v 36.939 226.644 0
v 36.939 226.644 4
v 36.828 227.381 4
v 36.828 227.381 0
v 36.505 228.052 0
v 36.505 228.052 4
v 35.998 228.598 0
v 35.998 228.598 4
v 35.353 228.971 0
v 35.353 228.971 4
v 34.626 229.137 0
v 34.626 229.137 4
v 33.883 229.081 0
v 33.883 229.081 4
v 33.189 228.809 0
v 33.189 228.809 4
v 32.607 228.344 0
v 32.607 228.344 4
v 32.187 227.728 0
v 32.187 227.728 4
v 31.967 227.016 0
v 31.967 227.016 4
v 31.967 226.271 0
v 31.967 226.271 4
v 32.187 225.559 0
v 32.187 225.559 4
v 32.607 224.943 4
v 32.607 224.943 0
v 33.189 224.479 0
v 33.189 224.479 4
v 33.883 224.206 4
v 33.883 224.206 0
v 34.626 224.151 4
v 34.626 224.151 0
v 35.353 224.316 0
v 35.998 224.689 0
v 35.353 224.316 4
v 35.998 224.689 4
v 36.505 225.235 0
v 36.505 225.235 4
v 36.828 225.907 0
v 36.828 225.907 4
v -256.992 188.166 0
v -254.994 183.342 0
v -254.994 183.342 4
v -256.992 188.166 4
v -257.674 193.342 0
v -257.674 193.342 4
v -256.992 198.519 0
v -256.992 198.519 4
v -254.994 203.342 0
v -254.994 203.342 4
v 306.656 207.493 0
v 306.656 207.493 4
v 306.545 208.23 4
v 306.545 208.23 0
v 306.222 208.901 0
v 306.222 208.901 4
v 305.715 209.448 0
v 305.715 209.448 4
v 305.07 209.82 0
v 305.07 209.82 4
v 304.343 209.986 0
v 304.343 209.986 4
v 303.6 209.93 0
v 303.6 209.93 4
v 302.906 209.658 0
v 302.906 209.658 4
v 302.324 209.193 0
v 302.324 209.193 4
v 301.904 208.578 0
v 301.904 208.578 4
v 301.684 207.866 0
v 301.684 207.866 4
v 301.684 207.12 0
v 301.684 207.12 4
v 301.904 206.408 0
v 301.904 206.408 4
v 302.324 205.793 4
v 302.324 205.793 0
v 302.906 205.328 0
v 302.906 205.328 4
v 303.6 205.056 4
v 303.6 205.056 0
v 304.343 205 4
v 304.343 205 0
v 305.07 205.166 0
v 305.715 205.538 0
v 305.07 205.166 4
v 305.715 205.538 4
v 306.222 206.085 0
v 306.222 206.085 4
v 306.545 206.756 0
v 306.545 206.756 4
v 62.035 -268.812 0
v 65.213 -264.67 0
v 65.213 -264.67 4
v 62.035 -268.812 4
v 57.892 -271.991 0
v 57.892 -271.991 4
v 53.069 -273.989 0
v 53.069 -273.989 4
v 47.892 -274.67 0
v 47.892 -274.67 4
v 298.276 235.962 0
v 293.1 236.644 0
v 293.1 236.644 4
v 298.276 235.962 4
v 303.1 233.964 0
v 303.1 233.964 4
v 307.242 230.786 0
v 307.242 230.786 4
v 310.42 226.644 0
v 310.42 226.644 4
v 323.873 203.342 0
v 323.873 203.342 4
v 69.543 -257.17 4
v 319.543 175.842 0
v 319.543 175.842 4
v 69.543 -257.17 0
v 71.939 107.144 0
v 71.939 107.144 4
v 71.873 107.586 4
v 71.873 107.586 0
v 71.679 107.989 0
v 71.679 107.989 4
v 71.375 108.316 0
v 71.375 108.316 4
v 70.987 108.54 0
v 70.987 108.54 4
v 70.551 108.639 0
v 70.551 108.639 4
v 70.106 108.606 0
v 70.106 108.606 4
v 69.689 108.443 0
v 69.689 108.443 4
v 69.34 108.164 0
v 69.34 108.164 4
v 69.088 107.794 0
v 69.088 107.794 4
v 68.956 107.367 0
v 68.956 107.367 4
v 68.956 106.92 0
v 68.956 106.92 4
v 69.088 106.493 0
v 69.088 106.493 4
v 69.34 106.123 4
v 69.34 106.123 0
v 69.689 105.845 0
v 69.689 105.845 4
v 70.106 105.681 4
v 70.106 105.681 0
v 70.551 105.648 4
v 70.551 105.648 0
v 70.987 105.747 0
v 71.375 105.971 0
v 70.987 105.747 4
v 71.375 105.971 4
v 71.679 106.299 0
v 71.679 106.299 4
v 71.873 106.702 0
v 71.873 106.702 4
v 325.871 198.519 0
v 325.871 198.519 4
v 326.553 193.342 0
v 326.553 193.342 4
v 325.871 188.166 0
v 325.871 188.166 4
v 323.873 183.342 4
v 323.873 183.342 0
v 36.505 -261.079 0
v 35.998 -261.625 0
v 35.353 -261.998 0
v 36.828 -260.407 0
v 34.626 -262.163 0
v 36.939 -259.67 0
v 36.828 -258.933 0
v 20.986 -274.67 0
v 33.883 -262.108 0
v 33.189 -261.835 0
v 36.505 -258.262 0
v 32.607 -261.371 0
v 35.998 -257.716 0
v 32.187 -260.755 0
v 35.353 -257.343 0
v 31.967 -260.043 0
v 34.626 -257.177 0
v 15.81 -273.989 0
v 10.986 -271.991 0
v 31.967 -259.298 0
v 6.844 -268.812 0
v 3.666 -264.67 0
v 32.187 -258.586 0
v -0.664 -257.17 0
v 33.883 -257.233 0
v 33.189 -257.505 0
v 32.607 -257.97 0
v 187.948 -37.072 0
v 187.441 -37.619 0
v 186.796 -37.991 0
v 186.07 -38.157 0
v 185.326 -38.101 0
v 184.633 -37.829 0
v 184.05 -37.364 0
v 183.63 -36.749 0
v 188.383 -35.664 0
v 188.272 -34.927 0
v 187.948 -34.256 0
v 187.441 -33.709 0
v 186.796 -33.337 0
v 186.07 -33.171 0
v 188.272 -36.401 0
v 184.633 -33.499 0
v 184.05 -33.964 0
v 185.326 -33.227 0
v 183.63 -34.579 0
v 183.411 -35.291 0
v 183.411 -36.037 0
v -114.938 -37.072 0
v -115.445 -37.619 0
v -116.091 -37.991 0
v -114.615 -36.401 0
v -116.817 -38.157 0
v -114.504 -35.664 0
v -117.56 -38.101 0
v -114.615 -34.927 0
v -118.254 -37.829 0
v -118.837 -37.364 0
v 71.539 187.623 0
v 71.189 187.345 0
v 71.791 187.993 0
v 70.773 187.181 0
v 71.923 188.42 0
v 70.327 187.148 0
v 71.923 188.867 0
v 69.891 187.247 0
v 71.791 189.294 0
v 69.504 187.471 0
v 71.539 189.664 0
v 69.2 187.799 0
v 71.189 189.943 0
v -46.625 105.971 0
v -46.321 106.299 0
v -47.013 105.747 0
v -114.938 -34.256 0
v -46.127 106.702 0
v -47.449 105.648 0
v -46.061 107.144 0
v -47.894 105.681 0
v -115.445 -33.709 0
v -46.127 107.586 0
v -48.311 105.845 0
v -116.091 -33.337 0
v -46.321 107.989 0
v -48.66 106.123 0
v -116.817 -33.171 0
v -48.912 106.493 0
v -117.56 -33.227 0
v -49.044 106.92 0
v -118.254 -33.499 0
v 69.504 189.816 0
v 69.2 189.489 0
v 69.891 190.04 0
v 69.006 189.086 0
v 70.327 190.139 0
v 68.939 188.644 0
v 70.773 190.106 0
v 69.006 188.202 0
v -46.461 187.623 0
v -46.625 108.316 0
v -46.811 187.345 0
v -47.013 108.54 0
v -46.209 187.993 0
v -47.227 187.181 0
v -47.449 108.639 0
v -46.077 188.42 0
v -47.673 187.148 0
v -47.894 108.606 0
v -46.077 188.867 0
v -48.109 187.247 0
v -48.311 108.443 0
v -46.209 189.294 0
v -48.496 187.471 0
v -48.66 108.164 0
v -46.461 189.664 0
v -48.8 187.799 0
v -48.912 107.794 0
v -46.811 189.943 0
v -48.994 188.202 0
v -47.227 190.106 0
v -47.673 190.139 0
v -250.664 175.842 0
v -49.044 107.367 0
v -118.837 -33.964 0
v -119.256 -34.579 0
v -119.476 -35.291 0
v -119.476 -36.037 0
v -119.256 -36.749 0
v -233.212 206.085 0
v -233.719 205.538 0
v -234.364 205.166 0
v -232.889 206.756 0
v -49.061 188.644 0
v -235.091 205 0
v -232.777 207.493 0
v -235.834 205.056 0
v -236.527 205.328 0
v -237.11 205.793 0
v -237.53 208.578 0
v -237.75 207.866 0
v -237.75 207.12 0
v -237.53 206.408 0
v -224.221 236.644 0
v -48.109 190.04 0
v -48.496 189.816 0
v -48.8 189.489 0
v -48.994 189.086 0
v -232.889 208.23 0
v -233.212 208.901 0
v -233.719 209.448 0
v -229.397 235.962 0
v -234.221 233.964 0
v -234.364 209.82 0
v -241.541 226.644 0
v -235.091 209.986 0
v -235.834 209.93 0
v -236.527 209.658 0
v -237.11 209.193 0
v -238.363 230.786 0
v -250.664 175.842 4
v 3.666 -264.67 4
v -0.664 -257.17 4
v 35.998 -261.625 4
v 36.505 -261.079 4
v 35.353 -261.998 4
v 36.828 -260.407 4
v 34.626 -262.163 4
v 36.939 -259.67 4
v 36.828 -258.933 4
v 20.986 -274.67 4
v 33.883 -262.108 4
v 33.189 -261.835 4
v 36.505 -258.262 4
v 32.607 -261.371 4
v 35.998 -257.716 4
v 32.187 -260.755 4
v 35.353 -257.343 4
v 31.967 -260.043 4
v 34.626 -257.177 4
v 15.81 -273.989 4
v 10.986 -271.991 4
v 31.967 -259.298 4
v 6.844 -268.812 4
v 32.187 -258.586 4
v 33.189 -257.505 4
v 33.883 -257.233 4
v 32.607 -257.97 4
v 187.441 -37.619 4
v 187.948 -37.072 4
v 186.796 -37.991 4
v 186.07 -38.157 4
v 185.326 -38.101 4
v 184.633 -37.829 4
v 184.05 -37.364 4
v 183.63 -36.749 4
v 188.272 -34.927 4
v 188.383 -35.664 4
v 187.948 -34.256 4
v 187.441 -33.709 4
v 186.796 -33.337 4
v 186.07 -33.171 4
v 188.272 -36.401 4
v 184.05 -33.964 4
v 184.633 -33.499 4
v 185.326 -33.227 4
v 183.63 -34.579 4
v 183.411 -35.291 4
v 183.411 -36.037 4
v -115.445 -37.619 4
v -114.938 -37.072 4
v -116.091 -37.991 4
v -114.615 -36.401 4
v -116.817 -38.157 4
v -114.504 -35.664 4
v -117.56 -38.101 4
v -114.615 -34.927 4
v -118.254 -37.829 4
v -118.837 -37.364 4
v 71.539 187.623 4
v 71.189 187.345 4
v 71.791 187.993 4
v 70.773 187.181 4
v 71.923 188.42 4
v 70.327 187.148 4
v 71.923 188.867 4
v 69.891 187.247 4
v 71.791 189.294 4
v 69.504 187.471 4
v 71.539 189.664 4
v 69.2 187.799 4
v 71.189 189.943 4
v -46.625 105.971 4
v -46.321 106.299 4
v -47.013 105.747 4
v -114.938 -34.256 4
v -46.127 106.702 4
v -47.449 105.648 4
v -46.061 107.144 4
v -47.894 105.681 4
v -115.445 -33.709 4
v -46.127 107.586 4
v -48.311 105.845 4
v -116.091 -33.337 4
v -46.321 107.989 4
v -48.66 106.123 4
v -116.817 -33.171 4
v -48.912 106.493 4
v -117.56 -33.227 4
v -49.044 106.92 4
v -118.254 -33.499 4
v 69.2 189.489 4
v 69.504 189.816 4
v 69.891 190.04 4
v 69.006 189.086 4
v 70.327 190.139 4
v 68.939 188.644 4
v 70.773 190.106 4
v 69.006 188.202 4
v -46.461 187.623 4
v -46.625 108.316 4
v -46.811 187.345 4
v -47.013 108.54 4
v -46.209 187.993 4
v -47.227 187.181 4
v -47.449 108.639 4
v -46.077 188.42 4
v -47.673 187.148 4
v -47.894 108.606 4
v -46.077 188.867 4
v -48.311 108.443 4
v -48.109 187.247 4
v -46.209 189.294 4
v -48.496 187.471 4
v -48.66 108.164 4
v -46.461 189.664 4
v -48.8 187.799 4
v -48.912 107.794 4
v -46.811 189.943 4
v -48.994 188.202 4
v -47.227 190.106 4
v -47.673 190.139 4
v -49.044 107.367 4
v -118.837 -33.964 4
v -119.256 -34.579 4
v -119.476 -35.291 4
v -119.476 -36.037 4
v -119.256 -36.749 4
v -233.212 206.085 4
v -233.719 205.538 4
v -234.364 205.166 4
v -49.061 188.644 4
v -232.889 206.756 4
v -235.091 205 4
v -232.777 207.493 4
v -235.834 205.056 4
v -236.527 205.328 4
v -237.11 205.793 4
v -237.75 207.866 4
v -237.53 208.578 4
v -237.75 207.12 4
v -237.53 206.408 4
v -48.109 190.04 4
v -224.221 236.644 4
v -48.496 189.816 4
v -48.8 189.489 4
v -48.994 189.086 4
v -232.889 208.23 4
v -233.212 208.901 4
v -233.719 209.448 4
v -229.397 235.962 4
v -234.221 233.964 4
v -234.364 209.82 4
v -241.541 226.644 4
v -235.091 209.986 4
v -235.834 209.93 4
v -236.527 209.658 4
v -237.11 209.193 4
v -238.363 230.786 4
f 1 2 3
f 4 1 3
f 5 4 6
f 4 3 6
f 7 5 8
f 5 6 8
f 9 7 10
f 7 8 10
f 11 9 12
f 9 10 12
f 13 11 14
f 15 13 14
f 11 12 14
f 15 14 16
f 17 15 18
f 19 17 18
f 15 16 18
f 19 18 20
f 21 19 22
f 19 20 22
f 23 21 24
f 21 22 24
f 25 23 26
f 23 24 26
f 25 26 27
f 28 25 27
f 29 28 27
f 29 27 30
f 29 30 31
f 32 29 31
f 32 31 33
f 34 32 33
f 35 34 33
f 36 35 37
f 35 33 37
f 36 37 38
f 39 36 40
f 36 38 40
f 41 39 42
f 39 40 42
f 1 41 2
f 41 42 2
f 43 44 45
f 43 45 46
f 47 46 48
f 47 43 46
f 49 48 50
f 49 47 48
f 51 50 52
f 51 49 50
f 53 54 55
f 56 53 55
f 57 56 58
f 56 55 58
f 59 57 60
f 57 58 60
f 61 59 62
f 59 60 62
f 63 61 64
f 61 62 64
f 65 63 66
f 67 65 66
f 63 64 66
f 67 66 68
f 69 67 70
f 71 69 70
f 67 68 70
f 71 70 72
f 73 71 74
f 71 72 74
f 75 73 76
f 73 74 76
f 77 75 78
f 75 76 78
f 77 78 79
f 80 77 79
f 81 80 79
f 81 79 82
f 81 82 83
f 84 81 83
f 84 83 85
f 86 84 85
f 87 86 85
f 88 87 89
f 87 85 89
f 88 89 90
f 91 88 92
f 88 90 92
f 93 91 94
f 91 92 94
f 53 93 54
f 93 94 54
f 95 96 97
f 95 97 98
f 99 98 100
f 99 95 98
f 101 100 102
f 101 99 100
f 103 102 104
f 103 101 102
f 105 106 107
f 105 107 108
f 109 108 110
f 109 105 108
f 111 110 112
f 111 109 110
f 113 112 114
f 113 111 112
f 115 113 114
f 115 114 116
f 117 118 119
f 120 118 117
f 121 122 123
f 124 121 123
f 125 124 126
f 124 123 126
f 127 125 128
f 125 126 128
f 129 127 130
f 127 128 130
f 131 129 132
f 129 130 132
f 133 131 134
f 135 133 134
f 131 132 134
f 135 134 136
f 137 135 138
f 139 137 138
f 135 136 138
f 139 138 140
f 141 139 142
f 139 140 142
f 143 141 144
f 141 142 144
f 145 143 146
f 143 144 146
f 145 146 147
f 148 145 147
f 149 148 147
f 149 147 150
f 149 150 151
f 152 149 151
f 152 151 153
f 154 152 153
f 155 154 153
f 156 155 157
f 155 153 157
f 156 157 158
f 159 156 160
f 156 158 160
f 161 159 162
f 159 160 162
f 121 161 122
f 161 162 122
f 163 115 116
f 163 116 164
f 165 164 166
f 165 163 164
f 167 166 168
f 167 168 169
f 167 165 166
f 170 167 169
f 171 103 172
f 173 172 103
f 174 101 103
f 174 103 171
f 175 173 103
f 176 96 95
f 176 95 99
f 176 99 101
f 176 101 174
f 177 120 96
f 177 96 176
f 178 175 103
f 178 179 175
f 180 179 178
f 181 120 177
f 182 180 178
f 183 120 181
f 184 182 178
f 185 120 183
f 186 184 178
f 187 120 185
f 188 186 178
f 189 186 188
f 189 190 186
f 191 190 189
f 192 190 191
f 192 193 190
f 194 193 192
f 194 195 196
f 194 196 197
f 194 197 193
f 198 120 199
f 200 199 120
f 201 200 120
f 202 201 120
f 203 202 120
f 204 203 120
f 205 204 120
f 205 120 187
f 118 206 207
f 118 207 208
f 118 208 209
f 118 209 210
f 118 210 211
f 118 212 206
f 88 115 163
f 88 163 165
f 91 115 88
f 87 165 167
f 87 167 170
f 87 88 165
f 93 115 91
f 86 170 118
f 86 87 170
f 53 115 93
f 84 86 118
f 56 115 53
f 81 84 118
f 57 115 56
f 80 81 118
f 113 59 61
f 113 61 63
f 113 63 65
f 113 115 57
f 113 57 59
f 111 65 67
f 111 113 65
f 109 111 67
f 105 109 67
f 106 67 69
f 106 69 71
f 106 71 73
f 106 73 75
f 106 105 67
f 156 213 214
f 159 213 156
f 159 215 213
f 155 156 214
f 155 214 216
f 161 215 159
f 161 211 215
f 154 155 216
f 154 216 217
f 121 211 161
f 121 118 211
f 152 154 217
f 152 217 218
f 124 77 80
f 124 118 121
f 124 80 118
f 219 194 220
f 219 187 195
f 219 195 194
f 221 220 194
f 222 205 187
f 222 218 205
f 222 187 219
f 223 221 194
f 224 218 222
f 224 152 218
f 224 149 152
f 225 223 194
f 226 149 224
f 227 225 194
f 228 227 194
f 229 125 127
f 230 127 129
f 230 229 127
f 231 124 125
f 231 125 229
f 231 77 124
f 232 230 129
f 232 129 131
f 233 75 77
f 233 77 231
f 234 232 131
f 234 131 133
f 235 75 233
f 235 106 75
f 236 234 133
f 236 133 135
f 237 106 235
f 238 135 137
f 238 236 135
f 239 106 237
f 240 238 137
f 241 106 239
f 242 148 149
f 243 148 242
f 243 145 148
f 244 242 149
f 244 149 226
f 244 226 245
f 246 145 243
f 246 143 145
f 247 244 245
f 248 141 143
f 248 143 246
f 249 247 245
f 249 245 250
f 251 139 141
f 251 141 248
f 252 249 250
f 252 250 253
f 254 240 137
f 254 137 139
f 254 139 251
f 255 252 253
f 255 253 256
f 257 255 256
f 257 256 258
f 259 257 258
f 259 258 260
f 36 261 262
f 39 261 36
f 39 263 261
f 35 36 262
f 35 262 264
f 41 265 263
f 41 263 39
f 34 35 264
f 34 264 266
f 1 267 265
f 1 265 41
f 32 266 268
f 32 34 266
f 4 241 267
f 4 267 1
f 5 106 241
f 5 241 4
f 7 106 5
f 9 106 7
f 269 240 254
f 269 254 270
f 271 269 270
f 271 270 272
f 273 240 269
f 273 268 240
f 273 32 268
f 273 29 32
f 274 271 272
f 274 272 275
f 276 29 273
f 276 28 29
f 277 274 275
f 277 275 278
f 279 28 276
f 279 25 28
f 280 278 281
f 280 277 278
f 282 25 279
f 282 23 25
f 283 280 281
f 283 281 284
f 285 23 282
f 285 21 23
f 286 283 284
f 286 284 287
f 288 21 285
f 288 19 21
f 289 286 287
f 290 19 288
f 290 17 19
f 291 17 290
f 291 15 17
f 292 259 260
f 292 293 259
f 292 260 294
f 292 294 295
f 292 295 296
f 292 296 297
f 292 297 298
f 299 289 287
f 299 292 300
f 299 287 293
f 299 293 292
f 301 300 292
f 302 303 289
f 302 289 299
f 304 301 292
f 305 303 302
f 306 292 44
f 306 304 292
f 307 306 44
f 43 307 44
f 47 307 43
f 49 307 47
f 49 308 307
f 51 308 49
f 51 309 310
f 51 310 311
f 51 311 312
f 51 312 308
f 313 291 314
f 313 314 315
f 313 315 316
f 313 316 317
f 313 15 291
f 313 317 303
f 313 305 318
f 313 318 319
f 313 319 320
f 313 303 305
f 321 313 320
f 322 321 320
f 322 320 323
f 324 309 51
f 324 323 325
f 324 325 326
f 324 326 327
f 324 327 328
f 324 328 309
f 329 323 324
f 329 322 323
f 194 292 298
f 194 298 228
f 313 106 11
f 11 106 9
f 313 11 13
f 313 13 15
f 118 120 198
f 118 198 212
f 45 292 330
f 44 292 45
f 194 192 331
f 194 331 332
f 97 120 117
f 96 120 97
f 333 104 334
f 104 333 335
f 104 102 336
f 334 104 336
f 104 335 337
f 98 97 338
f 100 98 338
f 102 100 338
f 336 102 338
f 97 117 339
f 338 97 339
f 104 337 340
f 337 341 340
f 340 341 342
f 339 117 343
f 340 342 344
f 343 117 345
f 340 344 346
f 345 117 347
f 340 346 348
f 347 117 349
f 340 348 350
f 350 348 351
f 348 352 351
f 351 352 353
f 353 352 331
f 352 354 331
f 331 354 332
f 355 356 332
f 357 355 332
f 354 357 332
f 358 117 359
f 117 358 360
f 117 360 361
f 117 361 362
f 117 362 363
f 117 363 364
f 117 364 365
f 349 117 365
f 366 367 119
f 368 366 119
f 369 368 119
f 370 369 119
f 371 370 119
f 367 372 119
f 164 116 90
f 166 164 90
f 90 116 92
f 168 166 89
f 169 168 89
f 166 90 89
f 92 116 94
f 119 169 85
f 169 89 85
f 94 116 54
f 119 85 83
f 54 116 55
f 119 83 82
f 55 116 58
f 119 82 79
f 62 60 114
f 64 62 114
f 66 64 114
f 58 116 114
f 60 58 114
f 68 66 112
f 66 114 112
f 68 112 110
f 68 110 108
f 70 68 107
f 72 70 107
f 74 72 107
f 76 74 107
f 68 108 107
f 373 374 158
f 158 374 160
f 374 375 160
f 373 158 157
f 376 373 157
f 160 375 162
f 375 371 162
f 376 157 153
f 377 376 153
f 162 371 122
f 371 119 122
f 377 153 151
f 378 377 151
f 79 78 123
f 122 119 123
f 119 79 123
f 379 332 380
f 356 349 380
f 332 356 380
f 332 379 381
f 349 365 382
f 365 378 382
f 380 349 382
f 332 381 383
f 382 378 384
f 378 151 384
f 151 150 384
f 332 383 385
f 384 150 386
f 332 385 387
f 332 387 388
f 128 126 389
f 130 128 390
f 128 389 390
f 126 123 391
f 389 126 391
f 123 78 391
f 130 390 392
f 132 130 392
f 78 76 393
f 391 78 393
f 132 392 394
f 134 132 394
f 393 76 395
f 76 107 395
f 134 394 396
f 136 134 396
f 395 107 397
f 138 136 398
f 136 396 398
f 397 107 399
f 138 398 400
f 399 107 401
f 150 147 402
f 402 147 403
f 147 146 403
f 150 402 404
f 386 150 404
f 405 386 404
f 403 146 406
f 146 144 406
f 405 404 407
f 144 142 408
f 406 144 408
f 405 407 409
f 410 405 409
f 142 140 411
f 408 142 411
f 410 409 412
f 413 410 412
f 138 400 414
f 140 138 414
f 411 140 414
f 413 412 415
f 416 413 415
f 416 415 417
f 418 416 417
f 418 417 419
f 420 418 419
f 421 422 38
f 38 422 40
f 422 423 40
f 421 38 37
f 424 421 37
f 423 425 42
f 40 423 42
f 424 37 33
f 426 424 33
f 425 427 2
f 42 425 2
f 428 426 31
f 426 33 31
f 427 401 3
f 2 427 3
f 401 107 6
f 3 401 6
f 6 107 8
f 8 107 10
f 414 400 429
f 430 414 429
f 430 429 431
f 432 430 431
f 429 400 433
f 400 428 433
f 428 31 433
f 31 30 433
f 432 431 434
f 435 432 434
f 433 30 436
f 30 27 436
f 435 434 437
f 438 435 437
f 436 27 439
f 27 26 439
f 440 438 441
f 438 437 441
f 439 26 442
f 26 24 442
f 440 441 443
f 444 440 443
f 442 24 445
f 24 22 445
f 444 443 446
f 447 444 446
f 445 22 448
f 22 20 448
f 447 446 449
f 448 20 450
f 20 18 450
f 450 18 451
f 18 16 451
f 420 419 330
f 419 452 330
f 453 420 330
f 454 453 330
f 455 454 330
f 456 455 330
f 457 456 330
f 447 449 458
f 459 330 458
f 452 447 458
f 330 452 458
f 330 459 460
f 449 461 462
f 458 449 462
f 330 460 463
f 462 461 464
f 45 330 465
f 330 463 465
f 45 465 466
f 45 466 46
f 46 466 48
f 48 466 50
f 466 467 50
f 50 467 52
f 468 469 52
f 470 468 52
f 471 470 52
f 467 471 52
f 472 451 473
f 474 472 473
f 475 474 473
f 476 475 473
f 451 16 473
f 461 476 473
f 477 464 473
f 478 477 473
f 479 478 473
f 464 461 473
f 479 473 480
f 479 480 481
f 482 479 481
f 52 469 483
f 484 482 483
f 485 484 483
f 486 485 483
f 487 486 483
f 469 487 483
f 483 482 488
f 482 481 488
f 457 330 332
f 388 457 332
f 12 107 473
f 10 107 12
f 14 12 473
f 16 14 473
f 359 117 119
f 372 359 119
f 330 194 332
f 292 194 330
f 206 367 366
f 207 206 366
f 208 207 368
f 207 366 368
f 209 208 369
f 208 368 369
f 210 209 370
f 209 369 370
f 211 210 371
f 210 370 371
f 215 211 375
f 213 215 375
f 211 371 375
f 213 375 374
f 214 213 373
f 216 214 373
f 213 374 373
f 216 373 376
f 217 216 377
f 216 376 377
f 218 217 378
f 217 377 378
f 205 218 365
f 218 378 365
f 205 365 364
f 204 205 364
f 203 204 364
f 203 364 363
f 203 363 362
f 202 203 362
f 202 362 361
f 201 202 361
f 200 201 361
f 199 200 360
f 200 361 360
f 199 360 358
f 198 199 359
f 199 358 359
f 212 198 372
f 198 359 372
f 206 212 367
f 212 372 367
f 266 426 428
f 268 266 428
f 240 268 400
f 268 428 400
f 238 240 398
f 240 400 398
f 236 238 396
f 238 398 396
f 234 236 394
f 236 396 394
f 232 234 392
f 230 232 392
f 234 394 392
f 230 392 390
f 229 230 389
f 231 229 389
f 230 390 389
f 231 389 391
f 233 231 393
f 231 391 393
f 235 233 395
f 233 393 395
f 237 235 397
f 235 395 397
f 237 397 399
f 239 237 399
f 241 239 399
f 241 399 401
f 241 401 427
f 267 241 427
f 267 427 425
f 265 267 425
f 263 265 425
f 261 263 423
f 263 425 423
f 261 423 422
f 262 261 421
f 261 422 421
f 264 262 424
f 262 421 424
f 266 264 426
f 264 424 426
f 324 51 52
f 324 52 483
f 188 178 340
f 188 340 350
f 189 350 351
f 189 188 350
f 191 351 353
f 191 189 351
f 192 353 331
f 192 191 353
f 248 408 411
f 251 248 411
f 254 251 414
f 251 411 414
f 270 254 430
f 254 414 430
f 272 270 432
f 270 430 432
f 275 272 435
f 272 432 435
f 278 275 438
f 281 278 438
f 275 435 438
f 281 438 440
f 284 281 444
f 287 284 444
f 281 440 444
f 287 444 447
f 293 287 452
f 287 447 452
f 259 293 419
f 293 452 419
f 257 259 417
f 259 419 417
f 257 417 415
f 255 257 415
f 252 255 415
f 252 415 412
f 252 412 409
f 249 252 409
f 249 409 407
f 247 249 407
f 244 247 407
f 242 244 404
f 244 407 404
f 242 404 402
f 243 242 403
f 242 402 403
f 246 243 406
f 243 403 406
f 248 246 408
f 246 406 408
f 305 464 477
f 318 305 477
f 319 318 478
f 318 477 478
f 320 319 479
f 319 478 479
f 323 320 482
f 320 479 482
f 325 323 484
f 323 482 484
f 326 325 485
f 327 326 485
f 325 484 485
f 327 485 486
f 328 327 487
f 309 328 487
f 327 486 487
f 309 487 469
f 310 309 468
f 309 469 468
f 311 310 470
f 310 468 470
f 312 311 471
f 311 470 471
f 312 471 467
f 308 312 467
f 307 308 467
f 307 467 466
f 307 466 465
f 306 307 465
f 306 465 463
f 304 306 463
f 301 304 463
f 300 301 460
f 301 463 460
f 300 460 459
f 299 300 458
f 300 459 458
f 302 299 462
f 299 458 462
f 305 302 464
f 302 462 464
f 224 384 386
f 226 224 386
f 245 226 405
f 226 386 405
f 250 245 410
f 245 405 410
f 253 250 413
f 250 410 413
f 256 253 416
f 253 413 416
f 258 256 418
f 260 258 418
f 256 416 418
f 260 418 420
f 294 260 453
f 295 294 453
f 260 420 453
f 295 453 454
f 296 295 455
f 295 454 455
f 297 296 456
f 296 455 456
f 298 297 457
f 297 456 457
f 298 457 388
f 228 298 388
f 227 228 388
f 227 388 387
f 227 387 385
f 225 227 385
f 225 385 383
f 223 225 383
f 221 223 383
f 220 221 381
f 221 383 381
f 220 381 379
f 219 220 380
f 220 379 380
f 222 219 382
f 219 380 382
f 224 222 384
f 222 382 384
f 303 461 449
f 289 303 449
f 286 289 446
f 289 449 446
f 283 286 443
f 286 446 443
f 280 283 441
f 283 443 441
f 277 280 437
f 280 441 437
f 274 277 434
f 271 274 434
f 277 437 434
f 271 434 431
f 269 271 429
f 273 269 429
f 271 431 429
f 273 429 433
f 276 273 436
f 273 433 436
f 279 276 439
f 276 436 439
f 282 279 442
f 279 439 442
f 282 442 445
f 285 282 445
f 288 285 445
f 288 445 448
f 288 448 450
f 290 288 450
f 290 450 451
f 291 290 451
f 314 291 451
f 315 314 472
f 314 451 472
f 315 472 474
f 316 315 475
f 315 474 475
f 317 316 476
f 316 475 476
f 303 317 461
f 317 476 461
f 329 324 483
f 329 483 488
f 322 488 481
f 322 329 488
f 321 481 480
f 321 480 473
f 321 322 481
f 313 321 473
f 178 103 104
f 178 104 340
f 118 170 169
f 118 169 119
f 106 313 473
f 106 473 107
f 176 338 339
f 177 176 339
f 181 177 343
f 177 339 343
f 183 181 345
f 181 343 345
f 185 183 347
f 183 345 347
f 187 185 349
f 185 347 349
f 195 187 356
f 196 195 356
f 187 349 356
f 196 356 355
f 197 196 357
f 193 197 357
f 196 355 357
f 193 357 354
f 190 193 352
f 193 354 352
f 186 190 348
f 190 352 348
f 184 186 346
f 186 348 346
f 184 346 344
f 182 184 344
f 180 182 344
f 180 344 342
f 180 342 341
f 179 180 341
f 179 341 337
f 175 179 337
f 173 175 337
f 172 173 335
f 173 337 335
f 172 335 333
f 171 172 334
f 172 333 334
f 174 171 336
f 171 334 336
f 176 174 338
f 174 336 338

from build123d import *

# Parameters (mm, degrees)
SCHIZZO1_R                   = 2.1
ESTRUSIONE_ESTRUSIONE1_DEPTH = 4
SCHIZZO2_R                   = 2.5
TAGLIO_ESTRUSIONE1_DEPTH     = 4
SCHIZZO3_R                   = 1.5
TAGLIO_ESTRUSIONE3_DEPTH     = 4


with BuildPart() as part:
    # Schizzo1 → Estrusione-Estrusione1 (new body)
    with BuildSketch(Plane.XY):
        with BuildLine():
            Line((69.543022759, -257.170330876), (65.21289574, -264.670330876))
            ThreePointArc((65.21289574, -264.670330876), (57.892387664, -271.990838952), (47.892387664, -274.670330876))
            Line((47.892387664, -274.670330876), (20.986398432, -274.670330876))
            ThreePointArc((20.986398432, -274.670330876), (10.986398432, -271.990838952), (3.665890356, -264.670330876))
            Line((3.665890356, -264.670330876), (-0.664236663, -257.170330876))
            Line((-0.664236663, -257.170330876), (-250.664236663, 175.842371016))
            Line((-250.664236663, 175.842371016), (-254.994363682, 183.342371016))
            ThreePointArc((-254.994363682, 183.342371016), (-257.673855606, 193.342371016), (-254.994363682, 203.342371016))
            Line((-254.994363682, 203.342371016), (-241.541369065, 226.643641206))
            ThreePointArc((-241.541369065, 226.643641206), (-234.22086099, 233.964149281), (-224.22086099, 236.643641206))
            Line((-224.22086099, 236.643641206), (-215.560606952, 236.643641206))
            Line((-215.560606952, 236.643641206), (284.439393048, 236.643641206))
            Line((284.439393048, 236.643641206), (293.099647086, 236.643641206))
            ThreePointArc((293.099647086, 236.643641206), (303.099647086, 233.964149281), (310.420155162, 226.643641206))
            Line((310.420155162, 226.643641206), (323.873149778, 203.342371016))
            ThreePointArc((323.873149778, 203.342371016), (326.552641702, 193.342371016), (323.873149778, 183.342371016))
            Line((323.873149778, 183.342371016), (319.543022759, 175.842371016))
            Line((319.543022759, 175.842371016), (69.543022759, -257.170330876))
        make_face()
        with Locations((34.439393048, -259.670330876)):
            Circle(SCHIZZO1_R, mode=Mode.SUBTRACT)
        with Locations((304.156271413, 207.493006111)):
            Circle(SCHIZZO1_R, mode=Mode.SUBTRACT)
        with Locations((-235.277485317, 207.493006111)):
            Circle(SCHIZZO1_R, mode=Mode.SUBTRACT)
    extrude(amount=ESTRUSIONE_ESTRUSIONE1_DEPTH)

    # Schizzo2 → Taglio-Estrusione1 (cut)
    with BuildSketch(Plane.XY.offset(4)):
        with Locations((34.439393048, 226.643641206)):
            Circle(SCHIZZO2_R)
        with Locations((-235.277485317, 207.493006111)):
            Circle(SCHIZZO2_R)
        with Locations((304.156271413, 207.493006111)):
            Circle(SCHIZZO2_R)
        with Locations((34.439393048, -259.670330876)):
            Circle(SCHIZZO2_R)
        with Locations((185.882768721, -35.66397993)):
            Circle(SCHIZZO2_R)
        with Locations((-117.003982625, -35.66397993)):
            Circle(SCHIZZO2_R)
    extrude(amount=-TAGLIO_ESTRUSIONE1_DEPTH, mode=Mode.SUBTRACT)

    # Schizzo3 → Taglio-Estrusione3 (cut)
    with BuildSketch(Plane.XY.offset(4)):
        with Locations((-47.560606952, 107.143641206)):
            Circle(SCHIZZO3_R)
        with Locations((70.439393048, 107.143641206)):
            Circle(SCHIZZO3_R)
        with Locations(Location((-47.560606952, 188.643641206, 0), (0, 0, 180))):
            Circle(SCHIZZO3_R)
        with Locations(Location((70.439393048, 188.643641206, 0), (0, 0, 180))):
            Circle(SCHIZZO3_R)
    extrude(amount=-TAGLIO_ESTRUSIONE3_DEPTH, mode=Mode.SUBTRACT)


solid = part.part
